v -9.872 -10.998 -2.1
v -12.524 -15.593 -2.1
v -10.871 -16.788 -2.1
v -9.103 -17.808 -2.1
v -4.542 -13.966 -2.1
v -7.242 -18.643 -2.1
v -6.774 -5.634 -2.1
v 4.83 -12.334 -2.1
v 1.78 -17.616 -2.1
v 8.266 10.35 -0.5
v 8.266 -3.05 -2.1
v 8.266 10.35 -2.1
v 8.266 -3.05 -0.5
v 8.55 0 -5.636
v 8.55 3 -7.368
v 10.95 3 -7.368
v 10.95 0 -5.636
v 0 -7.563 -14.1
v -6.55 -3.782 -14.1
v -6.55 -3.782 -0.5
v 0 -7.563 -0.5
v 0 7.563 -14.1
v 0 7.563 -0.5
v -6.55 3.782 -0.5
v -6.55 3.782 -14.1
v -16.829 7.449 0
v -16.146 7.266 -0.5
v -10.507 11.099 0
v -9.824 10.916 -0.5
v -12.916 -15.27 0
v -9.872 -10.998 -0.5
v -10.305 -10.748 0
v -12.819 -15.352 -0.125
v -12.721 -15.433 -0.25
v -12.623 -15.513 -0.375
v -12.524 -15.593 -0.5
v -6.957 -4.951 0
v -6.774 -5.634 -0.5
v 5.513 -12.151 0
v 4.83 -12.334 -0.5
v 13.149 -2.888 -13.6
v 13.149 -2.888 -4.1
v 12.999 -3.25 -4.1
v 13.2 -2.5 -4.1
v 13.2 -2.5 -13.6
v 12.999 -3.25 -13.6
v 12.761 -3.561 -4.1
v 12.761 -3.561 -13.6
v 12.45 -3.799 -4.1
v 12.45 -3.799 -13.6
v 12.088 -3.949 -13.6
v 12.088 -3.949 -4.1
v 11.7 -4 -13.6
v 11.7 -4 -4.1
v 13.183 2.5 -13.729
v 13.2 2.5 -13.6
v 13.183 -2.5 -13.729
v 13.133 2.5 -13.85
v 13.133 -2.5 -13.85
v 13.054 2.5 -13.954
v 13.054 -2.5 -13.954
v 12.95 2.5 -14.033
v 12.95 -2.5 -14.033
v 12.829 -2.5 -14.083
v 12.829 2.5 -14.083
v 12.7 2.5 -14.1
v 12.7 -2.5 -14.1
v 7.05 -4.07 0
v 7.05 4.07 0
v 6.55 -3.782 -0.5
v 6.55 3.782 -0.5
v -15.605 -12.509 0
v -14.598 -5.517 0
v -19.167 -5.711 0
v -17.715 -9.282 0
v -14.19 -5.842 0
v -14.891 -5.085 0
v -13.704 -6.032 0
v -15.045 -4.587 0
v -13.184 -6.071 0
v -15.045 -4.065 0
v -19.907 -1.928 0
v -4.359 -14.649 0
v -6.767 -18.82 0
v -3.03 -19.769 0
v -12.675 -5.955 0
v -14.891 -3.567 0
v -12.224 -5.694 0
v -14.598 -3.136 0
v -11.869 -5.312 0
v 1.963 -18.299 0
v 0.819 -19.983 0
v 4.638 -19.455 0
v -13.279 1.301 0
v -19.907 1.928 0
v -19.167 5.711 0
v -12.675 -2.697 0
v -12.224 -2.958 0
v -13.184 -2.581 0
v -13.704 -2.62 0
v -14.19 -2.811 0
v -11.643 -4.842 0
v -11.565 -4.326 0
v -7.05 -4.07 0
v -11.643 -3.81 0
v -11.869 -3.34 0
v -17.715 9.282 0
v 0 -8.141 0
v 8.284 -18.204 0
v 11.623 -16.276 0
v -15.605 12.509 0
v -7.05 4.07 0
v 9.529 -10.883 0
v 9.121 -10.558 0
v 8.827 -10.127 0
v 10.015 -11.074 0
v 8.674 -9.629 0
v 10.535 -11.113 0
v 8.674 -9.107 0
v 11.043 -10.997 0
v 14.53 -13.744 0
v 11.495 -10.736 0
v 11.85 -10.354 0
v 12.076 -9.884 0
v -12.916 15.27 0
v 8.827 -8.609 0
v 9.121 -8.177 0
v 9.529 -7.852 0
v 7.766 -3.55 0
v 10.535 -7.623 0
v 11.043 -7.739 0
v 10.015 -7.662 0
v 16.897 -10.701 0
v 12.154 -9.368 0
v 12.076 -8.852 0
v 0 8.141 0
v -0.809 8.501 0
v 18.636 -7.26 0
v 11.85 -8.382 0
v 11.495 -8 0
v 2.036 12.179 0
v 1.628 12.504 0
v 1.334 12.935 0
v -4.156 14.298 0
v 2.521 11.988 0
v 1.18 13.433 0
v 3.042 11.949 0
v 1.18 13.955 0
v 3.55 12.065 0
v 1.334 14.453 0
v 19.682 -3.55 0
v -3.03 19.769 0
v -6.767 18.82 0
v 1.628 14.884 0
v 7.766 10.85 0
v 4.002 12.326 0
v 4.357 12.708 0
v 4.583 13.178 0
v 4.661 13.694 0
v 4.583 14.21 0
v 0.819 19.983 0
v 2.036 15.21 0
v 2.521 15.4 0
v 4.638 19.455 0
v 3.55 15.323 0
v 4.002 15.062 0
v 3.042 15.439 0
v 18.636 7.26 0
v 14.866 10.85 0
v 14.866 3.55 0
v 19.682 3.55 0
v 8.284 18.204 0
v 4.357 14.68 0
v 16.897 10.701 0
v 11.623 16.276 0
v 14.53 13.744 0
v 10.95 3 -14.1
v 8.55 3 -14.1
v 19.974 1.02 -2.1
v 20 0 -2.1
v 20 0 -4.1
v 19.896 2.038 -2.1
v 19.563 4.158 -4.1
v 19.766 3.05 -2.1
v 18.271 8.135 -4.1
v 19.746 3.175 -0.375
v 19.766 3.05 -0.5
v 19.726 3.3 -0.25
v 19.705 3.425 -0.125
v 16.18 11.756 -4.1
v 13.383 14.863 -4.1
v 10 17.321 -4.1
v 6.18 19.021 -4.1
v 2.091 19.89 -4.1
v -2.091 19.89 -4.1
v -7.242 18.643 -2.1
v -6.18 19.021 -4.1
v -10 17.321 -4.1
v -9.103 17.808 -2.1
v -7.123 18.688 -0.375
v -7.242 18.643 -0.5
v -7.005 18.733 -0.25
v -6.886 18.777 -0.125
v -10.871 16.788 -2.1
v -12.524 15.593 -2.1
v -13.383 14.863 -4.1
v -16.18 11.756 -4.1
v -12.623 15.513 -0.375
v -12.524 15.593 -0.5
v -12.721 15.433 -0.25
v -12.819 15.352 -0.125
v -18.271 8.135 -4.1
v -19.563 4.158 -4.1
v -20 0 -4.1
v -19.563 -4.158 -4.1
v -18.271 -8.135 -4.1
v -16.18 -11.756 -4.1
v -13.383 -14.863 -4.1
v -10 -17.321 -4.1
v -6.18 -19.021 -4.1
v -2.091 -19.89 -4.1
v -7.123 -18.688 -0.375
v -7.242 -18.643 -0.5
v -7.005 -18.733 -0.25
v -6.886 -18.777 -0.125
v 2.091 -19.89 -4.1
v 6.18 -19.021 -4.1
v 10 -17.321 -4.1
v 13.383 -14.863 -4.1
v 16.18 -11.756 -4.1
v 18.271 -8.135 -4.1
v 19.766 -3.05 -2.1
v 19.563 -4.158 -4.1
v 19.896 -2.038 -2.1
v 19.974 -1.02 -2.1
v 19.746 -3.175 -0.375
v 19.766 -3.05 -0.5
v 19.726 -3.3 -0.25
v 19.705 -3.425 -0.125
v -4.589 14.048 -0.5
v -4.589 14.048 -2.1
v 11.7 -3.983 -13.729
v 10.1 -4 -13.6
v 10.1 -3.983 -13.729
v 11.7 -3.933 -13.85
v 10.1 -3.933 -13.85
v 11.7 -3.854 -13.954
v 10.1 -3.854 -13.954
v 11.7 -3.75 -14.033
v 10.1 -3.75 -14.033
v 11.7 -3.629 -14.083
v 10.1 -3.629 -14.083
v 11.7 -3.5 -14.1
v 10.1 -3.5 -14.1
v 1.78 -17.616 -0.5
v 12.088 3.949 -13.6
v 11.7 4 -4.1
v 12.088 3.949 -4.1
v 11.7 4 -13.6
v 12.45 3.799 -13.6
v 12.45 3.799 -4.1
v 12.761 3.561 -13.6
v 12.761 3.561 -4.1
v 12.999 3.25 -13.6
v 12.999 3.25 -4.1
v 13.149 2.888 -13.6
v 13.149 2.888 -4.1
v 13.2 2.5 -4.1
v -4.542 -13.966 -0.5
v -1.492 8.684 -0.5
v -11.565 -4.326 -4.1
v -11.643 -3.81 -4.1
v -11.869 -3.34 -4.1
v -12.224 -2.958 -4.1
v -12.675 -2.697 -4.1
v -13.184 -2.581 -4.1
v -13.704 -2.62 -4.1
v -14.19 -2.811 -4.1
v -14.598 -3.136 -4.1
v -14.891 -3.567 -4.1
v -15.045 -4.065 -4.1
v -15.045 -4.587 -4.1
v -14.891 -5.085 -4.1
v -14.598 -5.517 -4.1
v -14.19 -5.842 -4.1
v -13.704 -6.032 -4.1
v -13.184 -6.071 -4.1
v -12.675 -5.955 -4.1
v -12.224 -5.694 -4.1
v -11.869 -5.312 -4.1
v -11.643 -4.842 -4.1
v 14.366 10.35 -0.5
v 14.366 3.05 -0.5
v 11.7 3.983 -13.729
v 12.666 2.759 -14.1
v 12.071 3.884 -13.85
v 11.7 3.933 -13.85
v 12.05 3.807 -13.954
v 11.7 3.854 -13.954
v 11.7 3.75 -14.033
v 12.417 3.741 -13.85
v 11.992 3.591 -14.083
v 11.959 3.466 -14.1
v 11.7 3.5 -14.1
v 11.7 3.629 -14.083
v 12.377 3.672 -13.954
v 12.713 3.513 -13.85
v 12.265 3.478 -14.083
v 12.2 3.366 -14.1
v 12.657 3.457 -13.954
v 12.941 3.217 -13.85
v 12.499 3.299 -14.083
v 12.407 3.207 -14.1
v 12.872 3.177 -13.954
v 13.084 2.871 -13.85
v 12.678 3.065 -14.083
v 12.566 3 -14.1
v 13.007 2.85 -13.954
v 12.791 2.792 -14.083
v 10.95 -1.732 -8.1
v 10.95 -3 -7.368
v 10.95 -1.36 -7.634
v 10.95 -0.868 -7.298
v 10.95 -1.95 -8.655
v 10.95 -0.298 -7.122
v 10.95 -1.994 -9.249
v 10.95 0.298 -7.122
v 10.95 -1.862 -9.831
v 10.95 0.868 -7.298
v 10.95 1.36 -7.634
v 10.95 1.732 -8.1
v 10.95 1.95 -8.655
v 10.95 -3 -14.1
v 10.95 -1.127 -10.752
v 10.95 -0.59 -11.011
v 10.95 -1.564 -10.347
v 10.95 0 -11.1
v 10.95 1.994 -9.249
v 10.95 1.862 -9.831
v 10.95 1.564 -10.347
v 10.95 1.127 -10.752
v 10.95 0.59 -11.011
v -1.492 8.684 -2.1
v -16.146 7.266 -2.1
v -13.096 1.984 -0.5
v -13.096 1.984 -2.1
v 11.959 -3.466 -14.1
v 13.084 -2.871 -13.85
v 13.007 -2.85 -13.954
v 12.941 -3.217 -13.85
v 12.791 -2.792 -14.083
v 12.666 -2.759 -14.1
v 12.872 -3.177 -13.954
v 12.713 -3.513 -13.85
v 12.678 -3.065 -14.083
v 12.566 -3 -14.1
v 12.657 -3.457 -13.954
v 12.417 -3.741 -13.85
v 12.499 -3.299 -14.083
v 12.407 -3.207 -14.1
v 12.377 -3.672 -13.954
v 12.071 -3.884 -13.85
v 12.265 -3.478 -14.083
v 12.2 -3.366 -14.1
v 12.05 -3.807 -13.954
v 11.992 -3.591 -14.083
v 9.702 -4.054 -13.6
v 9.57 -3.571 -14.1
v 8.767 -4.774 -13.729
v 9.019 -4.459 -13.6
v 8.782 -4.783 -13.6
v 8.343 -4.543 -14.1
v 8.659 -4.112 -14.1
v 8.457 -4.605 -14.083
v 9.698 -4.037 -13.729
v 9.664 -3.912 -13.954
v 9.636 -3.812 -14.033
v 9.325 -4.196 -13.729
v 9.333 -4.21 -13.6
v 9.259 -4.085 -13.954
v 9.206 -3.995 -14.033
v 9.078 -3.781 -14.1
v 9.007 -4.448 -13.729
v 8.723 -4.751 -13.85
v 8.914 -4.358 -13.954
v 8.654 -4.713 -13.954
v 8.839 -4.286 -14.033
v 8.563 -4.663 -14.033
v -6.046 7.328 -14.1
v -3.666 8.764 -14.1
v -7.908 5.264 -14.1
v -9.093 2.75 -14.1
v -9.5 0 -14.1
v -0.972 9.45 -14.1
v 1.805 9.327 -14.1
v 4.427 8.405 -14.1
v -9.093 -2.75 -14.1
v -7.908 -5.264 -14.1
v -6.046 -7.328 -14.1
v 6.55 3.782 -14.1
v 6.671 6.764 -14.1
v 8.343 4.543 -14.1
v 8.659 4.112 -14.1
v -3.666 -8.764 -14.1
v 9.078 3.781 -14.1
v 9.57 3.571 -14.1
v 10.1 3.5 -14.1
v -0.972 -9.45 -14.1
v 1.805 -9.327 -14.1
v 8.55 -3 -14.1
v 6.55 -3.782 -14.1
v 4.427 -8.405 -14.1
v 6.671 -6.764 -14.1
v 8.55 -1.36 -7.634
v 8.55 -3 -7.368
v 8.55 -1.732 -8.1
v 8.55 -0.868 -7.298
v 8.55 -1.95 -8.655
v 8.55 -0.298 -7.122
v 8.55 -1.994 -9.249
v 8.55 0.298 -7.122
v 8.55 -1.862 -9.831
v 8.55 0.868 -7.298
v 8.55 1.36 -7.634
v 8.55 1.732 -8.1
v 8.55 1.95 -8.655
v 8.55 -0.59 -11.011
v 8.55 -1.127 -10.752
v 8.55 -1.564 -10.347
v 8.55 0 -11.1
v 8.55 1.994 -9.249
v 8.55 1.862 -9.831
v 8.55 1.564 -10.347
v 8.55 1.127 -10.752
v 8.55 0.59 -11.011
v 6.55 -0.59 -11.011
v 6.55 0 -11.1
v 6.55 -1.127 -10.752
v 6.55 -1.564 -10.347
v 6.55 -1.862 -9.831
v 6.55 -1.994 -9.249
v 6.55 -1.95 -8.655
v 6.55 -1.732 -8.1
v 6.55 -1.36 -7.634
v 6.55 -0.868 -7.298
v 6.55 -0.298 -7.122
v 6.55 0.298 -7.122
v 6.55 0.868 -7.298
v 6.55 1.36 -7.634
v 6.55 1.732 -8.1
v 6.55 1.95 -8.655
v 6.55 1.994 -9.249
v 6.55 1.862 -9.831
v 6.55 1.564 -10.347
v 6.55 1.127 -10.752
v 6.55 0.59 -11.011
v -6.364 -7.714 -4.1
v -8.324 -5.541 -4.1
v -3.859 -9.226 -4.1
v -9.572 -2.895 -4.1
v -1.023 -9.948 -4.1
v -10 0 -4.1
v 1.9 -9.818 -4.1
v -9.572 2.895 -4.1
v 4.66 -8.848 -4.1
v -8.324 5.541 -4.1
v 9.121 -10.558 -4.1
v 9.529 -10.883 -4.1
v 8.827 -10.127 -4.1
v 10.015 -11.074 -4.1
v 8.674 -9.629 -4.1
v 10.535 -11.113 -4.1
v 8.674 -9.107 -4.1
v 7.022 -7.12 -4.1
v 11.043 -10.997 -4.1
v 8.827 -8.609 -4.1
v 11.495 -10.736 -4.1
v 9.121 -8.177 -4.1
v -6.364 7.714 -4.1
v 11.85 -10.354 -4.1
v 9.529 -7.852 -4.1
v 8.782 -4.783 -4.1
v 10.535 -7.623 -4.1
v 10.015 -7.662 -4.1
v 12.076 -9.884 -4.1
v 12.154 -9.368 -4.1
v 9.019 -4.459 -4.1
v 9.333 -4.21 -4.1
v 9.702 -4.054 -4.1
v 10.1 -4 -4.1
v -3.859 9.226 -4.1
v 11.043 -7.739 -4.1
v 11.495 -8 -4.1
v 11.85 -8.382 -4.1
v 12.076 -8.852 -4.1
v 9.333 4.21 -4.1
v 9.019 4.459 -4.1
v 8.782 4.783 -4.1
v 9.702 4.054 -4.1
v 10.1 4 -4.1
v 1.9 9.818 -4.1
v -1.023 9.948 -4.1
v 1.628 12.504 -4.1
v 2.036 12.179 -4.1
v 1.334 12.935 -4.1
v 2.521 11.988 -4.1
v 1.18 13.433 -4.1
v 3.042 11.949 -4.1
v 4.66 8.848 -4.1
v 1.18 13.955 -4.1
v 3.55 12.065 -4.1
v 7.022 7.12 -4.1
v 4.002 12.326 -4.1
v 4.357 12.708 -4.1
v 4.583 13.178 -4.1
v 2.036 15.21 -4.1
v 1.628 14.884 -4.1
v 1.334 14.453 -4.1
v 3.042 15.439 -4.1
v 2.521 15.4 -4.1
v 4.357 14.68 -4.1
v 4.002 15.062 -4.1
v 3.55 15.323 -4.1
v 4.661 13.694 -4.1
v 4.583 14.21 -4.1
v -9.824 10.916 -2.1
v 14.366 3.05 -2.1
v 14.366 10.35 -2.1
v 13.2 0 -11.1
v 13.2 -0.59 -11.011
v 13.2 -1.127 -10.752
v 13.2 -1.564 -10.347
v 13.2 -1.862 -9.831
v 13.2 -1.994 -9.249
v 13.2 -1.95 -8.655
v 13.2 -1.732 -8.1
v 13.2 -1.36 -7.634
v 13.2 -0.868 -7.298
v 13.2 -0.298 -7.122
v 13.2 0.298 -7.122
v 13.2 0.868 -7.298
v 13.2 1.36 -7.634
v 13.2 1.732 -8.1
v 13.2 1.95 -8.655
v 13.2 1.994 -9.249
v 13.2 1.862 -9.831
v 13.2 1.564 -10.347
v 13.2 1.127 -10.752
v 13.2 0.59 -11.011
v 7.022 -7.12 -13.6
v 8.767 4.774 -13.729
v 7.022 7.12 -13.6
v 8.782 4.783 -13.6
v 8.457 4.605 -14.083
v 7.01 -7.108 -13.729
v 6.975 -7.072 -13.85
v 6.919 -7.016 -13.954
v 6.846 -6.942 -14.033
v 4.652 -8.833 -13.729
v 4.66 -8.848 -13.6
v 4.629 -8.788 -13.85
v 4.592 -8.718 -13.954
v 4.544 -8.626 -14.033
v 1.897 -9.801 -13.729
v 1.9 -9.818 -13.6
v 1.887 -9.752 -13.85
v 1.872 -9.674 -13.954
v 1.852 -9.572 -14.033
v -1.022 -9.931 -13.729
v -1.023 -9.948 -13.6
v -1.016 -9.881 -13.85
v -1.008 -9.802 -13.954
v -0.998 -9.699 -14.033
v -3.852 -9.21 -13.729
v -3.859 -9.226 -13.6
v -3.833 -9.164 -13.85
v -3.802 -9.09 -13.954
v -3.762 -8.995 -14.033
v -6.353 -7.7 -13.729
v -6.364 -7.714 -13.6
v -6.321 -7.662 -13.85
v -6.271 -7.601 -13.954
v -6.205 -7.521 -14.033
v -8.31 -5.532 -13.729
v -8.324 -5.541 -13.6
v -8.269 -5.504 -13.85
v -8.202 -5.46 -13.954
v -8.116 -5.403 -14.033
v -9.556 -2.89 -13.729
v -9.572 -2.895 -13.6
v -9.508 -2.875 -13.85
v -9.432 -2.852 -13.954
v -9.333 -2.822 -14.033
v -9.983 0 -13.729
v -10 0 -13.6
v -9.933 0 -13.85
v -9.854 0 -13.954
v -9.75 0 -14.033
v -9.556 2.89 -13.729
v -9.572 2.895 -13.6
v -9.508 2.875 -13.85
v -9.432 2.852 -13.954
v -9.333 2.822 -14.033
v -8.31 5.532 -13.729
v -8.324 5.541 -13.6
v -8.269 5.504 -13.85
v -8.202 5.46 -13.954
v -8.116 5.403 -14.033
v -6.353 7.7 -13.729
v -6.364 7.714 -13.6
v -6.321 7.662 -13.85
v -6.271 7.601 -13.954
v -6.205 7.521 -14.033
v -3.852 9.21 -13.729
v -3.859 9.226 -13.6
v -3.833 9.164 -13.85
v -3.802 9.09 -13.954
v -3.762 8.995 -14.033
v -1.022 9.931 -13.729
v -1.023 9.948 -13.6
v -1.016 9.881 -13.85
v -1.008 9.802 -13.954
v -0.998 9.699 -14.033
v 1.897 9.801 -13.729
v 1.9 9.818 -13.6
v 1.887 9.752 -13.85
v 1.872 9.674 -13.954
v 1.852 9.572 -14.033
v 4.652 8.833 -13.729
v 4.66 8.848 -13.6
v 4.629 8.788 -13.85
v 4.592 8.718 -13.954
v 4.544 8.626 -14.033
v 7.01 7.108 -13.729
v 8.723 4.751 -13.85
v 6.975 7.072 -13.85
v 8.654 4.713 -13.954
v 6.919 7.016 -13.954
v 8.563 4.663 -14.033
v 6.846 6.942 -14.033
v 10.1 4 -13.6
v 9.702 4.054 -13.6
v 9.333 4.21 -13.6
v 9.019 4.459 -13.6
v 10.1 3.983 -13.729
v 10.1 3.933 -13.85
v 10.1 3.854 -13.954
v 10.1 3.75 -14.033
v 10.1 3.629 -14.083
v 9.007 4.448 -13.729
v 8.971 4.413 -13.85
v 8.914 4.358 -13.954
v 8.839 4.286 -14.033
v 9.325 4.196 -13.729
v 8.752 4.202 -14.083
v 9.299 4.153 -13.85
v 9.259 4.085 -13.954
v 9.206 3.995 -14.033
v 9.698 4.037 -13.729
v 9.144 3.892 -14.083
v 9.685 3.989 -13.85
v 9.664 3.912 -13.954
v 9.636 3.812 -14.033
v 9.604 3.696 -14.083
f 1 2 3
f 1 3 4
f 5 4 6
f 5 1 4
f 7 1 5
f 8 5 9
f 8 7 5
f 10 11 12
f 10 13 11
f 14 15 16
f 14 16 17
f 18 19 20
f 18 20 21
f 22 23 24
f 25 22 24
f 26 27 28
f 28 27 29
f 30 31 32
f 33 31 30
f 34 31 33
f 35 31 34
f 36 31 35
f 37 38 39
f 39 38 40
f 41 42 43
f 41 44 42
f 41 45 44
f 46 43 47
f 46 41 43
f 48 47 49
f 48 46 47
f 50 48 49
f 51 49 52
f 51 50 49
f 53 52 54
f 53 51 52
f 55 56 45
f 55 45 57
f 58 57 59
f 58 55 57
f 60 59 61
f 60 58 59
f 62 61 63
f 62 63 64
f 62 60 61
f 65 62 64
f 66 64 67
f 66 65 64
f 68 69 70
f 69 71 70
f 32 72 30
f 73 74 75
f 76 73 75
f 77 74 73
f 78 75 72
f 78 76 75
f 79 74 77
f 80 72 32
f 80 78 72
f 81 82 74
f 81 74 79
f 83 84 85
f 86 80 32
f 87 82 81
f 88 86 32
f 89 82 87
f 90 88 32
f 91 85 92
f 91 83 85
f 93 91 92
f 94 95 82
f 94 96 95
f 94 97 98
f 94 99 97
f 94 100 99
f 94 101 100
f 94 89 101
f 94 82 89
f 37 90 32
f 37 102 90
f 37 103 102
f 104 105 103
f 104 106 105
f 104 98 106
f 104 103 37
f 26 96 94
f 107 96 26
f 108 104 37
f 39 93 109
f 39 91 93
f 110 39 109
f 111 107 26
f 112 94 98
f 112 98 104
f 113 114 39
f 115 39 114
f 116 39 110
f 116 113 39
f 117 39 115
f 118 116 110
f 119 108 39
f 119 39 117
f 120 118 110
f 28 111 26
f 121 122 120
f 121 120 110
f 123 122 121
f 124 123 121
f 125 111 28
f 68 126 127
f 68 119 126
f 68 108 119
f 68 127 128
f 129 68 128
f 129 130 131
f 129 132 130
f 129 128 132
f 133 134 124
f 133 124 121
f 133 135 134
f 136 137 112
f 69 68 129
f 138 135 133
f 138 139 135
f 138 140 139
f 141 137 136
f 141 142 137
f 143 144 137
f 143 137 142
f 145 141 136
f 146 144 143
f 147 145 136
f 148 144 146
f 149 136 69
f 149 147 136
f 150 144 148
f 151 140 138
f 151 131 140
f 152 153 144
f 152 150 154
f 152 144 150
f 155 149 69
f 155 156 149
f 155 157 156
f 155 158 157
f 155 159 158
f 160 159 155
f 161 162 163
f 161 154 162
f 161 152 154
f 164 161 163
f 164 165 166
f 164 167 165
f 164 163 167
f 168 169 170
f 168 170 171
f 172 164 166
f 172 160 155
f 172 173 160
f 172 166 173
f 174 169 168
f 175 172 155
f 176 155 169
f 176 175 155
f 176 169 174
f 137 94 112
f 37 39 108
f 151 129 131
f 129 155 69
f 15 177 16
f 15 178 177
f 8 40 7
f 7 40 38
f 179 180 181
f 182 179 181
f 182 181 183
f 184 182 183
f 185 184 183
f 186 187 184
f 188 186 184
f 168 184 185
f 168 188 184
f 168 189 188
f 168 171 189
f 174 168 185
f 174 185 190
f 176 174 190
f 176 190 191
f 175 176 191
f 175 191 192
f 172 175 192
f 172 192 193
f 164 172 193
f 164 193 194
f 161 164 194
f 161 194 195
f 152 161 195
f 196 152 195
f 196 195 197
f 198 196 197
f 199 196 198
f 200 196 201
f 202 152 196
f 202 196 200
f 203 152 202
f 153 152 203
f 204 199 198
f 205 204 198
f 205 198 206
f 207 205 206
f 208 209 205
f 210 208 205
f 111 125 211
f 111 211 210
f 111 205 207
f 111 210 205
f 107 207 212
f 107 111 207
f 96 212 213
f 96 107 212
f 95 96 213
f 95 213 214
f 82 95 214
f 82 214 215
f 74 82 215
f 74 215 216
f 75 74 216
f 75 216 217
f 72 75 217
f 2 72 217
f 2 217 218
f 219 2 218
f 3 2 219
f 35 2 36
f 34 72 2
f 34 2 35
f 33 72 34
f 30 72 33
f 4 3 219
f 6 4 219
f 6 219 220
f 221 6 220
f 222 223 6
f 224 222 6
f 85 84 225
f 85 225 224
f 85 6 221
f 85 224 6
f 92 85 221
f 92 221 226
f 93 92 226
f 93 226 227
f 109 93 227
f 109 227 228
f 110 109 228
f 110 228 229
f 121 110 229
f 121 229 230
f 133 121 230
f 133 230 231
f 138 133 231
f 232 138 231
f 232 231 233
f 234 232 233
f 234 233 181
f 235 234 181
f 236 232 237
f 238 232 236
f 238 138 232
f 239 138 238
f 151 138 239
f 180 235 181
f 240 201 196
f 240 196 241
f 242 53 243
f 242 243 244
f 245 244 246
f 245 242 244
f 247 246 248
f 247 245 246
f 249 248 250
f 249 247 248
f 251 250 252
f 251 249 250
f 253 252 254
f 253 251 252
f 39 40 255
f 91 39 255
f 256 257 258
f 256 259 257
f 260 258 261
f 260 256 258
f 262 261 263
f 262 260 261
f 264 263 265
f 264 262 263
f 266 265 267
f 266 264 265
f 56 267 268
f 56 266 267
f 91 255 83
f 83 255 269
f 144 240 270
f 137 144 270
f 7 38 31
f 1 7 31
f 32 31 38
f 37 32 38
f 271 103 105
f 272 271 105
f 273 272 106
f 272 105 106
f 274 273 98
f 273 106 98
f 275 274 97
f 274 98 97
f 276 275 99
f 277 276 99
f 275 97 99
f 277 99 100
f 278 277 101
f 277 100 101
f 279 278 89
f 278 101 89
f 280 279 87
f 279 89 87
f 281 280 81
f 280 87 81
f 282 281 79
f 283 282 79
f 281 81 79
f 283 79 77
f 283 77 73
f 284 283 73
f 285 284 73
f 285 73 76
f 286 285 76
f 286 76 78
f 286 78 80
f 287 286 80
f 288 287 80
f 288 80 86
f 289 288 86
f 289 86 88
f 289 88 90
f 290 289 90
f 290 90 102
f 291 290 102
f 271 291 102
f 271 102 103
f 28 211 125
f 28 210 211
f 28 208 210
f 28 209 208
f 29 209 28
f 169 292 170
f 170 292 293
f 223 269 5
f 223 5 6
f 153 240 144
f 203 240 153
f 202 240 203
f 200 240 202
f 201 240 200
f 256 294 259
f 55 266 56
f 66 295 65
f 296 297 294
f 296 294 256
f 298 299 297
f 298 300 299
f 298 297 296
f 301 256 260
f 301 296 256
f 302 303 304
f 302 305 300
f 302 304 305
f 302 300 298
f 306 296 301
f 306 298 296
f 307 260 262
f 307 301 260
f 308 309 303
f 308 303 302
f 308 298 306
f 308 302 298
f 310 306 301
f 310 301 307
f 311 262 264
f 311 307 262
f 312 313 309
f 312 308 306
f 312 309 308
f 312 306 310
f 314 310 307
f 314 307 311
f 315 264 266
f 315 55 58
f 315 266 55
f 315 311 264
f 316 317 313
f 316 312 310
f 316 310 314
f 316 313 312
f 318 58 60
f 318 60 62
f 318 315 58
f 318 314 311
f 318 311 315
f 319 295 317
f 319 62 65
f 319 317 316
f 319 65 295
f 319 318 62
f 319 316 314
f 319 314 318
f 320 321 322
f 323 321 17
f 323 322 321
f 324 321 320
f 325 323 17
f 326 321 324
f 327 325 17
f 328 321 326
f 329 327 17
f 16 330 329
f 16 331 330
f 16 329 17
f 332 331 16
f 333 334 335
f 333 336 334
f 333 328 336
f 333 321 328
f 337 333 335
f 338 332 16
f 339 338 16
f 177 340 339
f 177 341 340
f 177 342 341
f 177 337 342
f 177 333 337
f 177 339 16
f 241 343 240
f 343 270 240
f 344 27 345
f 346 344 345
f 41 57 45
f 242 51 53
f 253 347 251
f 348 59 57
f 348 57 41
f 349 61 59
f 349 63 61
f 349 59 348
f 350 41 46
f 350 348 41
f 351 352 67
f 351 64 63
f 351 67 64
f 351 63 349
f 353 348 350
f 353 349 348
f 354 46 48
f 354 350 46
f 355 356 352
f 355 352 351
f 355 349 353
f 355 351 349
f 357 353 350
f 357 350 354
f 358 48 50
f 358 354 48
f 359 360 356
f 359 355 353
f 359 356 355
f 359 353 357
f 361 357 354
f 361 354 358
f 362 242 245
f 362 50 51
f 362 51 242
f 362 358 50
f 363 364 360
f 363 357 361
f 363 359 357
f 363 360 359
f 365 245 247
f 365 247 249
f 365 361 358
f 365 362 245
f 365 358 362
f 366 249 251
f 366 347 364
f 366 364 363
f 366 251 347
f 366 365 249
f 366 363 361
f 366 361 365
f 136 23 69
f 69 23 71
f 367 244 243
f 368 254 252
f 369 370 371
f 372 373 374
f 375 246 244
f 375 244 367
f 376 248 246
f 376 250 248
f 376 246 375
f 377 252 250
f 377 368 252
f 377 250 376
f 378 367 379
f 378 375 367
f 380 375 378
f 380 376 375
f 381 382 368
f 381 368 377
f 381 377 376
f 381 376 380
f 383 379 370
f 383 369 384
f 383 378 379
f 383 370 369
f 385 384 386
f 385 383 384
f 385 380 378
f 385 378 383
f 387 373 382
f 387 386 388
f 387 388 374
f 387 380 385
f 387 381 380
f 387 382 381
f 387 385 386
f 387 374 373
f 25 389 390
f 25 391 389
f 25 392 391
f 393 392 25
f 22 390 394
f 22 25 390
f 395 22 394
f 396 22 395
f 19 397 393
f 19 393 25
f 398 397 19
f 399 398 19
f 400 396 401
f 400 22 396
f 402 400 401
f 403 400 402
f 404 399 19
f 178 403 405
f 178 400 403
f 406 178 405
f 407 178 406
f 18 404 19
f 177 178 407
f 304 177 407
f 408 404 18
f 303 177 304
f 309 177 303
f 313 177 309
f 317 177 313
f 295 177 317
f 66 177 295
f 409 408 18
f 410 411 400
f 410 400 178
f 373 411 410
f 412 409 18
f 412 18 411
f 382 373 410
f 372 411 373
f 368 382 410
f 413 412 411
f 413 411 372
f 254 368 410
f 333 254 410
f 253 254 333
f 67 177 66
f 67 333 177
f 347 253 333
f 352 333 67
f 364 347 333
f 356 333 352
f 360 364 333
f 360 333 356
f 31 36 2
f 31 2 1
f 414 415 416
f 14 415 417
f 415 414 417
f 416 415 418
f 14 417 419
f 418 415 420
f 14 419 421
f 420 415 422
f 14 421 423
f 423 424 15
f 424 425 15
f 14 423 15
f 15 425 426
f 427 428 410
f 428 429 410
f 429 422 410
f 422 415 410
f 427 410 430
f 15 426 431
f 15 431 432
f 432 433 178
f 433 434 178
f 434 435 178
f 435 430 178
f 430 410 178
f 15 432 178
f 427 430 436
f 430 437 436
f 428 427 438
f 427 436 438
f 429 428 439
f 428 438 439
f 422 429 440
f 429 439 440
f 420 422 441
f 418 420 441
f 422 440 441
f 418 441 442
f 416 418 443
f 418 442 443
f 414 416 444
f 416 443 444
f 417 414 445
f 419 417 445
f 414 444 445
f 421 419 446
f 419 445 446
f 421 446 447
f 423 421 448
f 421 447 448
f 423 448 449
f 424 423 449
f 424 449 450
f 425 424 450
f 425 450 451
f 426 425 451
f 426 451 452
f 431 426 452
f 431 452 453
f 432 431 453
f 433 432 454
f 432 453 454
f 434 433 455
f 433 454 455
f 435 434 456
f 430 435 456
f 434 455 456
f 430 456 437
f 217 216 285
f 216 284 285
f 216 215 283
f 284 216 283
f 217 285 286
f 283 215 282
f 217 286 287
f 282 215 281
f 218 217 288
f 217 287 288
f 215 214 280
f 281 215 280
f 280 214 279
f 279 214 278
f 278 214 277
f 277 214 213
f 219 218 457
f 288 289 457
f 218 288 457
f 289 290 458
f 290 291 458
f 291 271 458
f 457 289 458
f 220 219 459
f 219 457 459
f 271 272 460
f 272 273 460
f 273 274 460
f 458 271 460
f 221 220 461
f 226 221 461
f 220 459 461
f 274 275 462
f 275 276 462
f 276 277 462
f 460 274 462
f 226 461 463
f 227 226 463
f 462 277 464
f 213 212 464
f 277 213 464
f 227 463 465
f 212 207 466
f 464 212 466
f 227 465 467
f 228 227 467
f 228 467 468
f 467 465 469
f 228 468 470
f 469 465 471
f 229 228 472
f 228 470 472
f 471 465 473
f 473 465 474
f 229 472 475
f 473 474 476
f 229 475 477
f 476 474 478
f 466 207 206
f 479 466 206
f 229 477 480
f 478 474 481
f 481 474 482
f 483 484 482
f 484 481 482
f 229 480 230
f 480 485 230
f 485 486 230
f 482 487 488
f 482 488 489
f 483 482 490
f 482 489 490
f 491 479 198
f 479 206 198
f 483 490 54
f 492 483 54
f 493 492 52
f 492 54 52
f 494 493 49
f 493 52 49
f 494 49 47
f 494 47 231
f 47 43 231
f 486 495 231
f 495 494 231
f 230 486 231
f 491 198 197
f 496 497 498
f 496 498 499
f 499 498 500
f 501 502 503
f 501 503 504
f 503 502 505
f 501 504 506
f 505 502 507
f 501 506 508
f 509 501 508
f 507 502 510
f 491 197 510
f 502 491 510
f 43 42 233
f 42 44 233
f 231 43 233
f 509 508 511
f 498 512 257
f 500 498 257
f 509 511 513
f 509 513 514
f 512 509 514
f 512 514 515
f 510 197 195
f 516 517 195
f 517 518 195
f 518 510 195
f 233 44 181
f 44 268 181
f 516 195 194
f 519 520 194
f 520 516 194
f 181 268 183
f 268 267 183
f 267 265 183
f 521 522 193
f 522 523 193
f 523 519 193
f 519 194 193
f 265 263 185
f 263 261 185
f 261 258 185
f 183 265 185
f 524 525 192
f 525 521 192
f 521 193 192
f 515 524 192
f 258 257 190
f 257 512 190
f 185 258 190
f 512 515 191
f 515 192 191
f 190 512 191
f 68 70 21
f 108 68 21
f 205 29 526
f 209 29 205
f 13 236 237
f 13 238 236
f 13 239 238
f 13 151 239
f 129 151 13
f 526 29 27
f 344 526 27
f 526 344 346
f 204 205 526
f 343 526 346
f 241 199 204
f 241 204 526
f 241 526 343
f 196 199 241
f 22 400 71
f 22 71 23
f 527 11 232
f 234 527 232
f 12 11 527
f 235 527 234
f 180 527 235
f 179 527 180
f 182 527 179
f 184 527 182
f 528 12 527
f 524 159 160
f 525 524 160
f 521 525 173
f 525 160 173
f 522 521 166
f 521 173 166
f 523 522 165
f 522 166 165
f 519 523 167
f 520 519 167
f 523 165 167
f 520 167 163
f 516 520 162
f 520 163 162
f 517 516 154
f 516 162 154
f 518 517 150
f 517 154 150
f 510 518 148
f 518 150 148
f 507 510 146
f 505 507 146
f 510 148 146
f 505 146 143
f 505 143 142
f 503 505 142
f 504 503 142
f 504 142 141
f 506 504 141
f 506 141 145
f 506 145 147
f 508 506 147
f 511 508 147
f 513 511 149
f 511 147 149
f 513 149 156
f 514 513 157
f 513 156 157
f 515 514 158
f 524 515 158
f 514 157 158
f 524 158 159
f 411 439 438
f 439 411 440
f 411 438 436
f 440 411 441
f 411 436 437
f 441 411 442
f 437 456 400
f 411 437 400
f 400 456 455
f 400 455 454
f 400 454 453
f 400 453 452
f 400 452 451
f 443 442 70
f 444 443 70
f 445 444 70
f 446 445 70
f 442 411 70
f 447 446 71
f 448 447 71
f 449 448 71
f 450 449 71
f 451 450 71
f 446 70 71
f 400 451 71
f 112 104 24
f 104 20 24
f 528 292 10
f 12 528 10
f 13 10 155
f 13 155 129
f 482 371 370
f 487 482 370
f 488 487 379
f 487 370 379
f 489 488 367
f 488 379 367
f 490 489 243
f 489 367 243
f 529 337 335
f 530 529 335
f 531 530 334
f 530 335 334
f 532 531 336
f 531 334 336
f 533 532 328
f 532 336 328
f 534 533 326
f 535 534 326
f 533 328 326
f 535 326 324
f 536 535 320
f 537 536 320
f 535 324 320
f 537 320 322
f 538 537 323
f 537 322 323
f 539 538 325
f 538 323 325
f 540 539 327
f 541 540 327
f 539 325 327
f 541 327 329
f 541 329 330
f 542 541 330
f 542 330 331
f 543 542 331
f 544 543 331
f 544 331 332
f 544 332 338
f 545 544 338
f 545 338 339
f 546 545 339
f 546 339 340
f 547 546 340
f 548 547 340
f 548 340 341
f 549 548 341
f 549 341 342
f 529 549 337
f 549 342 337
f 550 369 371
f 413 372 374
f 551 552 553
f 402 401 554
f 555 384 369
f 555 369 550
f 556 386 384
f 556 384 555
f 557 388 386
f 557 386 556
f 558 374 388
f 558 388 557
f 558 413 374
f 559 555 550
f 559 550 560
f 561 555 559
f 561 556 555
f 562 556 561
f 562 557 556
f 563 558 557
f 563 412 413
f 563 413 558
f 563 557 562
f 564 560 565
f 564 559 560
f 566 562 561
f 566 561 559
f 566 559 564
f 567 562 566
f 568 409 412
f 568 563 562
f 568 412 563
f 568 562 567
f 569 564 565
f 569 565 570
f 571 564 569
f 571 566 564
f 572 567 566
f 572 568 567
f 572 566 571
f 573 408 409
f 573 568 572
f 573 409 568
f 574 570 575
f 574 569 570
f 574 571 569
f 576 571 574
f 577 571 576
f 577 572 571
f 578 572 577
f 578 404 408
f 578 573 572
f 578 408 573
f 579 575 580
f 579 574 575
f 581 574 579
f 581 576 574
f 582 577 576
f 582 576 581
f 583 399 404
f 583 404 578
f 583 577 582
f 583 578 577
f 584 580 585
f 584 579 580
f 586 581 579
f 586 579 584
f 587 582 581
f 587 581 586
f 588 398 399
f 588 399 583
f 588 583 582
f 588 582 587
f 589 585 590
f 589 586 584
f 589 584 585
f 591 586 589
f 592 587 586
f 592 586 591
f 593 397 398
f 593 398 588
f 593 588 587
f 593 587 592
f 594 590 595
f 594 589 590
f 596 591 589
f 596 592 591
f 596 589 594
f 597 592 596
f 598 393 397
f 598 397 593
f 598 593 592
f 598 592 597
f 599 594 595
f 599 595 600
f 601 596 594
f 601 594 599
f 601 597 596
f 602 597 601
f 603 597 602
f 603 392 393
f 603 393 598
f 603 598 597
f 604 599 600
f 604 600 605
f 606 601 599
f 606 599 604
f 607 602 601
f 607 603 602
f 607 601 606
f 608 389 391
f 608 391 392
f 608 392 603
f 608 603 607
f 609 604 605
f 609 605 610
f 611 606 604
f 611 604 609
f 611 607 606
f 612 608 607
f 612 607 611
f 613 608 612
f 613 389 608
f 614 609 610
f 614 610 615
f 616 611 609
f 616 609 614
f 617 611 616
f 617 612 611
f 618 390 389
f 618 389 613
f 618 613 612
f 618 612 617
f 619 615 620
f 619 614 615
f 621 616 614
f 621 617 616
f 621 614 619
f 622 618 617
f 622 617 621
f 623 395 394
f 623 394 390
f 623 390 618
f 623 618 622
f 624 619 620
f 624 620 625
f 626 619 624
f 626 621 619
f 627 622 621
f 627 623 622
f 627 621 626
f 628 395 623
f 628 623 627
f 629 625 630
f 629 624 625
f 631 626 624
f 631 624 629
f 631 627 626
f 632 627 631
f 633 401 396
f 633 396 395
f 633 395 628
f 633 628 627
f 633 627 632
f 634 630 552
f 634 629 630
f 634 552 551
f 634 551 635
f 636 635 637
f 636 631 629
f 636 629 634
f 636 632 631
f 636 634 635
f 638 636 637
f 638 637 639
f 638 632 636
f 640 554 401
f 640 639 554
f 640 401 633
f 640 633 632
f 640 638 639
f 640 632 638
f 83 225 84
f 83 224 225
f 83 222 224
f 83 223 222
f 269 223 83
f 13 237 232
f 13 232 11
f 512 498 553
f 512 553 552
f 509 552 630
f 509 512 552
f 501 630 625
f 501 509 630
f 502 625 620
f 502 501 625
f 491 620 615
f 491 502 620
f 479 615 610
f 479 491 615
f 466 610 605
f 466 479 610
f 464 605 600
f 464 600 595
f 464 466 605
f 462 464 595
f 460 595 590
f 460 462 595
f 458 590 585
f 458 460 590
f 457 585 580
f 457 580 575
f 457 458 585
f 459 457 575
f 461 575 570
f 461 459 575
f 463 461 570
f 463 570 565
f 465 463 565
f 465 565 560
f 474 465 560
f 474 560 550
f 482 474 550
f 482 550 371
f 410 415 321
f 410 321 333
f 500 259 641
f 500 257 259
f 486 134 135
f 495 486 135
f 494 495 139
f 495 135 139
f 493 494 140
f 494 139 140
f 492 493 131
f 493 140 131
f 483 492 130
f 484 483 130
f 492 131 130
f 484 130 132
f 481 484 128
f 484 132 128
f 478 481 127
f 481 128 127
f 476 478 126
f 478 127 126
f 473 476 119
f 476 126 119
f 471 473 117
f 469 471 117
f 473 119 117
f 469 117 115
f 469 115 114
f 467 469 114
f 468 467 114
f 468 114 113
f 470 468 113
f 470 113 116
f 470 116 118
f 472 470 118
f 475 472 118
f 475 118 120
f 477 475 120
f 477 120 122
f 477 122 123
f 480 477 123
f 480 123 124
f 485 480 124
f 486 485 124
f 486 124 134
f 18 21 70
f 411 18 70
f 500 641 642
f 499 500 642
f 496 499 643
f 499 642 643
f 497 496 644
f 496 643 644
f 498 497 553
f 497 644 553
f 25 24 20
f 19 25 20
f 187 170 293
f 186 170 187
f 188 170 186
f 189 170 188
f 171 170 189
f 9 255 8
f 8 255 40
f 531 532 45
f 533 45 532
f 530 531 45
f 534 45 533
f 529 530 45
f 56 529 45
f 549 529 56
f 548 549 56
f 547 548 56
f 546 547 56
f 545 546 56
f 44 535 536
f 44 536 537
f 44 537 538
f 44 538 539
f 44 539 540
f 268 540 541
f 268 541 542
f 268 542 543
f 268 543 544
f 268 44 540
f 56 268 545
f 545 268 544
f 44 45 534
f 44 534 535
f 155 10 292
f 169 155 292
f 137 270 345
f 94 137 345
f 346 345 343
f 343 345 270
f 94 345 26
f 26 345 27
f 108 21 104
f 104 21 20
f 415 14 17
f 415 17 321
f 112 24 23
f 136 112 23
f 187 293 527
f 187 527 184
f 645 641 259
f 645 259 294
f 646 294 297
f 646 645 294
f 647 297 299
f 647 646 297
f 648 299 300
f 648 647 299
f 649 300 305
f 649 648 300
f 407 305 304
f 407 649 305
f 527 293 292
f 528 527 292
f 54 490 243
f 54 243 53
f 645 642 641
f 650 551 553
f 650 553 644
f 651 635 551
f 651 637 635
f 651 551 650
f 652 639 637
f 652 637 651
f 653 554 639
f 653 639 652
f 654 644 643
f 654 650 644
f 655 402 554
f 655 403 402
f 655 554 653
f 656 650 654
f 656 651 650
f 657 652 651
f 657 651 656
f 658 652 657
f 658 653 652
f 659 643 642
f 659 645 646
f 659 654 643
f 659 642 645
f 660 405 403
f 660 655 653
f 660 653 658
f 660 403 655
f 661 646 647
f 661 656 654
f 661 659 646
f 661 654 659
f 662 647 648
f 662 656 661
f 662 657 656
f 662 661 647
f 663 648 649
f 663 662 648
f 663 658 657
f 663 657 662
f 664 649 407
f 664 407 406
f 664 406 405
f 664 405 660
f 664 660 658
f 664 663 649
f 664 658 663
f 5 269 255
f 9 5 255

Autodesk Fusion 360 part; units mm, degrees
sketch "Esquisse1" plane through (0, 0, 0) normal (0, 0, 1) x (1, 0, 0)
  circle A0 centre (0, 0) radius 20
  line L0 (19.7661, -3.05) -> (8.2661, -3.05)
  line L1 (8.2661, -3.05) -> (8.2661, 3.1)
  line L2 (14.3661, 3.05) -> (19.7661, 3.05)
  line L3 (8.2661, -3.05) -> (14.4602, -3.05)
  line L4 (14.3661, 10.35) -> (8.2661, 10.35)
  line L5 (8.2661, 10.35) -> (8.2661, -3.05)
  line L6 (0, 0) -> (29, 0) construction
  line L7 (14.3661, 3.05) -> (14.3661, 10.35)
  line L8 (-9.8244, 10.9164) -> (-16.1464, 7.2664)
  line L9 (-16.1464, 7.2664) -> (-13.0964, 1.9836)
  line L10 (-13.0964, 1.9836) -> (-1.4917, 8.6836)
  line L11 (-1.4917, 8.6836) -> (-4.5887, 14.0479)
  line L12 (-7.2417, 18.6429) -> (-1.4917, 8.6836)
  line L13 (-9.8244, 10.9164) -> (-12.5244, 15.5929)
  line L14 (-4.5417, -13.9664) -> (1.7803, -17.6164)
  line L15 (1.7803, -17.6164) -> (4.8303, -12.3336)
  line L16 (4.8303, -12.3336) -> (-6.7744, -5.6336)
  line L17 (-6.7744, -5.6336) -> (-9.8715, -10.9979)
  line L18 (-12.5244, -15.5929) -> (-6.7744, -5.6336)
  line L19 (-4.5417, -13.9664) -> (-7.2417, -18.6429)
  circle A1 centre (2.9108, 13.6941) radius 1.75
  line L20 (0, 0) -> (2.9108, 13.6941) construction
  circle A2 centre (-13.3148, -4.3262) radius 1.75
  circle A3 centre (10.404, -9.3678) radius 1.75
  line L21 (6.55, 3.7816) -> (0, 7.5633)
  line L22 (0, 7.5633) -> (-6.55, 3.7816)
  line L23 (-6.55, 3.7816) -> (-6.55, -3.7816)
  line L24 (-6.55, -3.7816) -> (0, -7.5633)
  line L25 (0, -7.5633) -> (6.55, -3.7816)
  line L26 (6.55, -3.7816) -> (6.55, 3.7816)
  dimension "d1" = 40
  dimension "d2" = 6.1
  dimension "d3" = 11.5
  dimension "d6" = 6.1
  dimension "d7" = 3.05
  dimension "d8" = 13.4
  dimension "d10" = 360
  dimension "d16" = 3.5
  dimension "d17" = 78
  dimension "d19" = 360
  dimension "d21" = 14
  dimension "d25" = 6.55
extrude "Extrusion1" add sketch "Esquisse1" against normal blind 4.1 contours A0 L0 L1 L2 L3 L4 L5 L7 | A0 L0 L1 L2 L3 L4 L5 L7 L8 L9 L10 L11 L12 L13 L14 L15 L16 L17 L18 L19 | A0 L8 L9 L10 L11 L12 L13 | A0 L14 L15 L16 L17 L18 L19 | A1 | A2 | A3 | L21 L22 L23 L24 L25 L26
extrude "Extrusion2" cut sketch "Esquisse1" against normal blind 2.1 contours A0 L0 L1 L2 L3 L4 L5 L7 | A0 L8 L9 L10 L11 L12 L13 | A0 L14 L15 L16 L17 L18 L19
chamfer "Chanfrein1" distance 0.5 angle 45 15 edges at (-4.3667, 13.6633, 0) (-11.1744, 13.2546, 0) (-12.9854, 9.0914, 0) (-14.6214, 4.625, 0) (-7.294, 5.3336, 0) (-9.6494, -10.6133, 0) (-0.972, -8.9836, 0) (-5.8917, -16.3046, 0) (-1.3807, -15.7914, 0) (3.3053, -14.975, 0) (8.2661, 3.65, 0) (14.0161, -3.05, 0) (17.0661, 3.05, 0) (14.3661, 6.7, 0) (11.3161, 10.35, 0)
extrude "Extrusion5" cut sketch "Esquisse1" against normal blind 4.1 contours A1 | A2 | A3
extrude "Extrusion6" cut sketch "Esquisse1" against normal blind 4.1 contours L21 L22 L23 L24 L25 L26
chamfer "Chanfrein4" distance 0.5 angle 45 6 edges at (-6.55, 0, 0) (-3.275, 5.6725, 0) (3.275, 5.6725, 0) (6.55, 0, 0) (3.275, -5.6725, 0) (-3.275, -5.6725, 0)
sketch "Esquisse2" plane through (0, 0, -4.1) normal (0, 0, -1) x (1, 0, 0)
  circle A0 centre (0, 0) radius 20
  circle A1 centre (2.9108, -13.6941) radius 1.75
  circle A2 centre (10.404, 9.3678) radius 1.75
  circle A3 centre (-13.3148, 4.3262) radius 1.75
  line L0 (9.1652, 4) -> (13.2, 4)
  line L1 (13.2, 4) -> (13.2, -4)
  line L2 (13.2, -4) -> (9.1652, -4)
  arc A4 (9.1652, 4) -> (9.1652, -4) centre (0, 0) ccw
  line L3 (6.55, -3.7816) -> (0, -7.5633)
  line L4 (0, -7.5633) -> (-6.55, -3.7816)
  line L5 (-6.55, -3.7816) -> (-6.55, 3.7816)
  line L6 (-6.55, 3.7816) -> (0, 7.5633)
  line L7 (0, 7.5633) -> (6.55, 3.7816)
  line L8 (6.55, 3.7816) -> (6.55, -3.7816)
  dimension "d36" = 20
  dimension "d37" = 8
  dimension "d39" = 4
extrude "Extrusion7" add sketch "Esquisse2" along normal blind 10 contours L0 L1 L2 A4
ref_plane "Plan de construction2" through (8.55, 0, -7.3) normal (-1, 0, 0) x (0, 1, 0)
sketch "Esquisse3" plane through (8.55, 0, 0) normal (-1, 0, 0) x (0, 1, 0)
  line L0 (4, -4.1) -> (-4, -4.1)
  line L1 (-4, -4.1) -> (-4, -14.1)
  line L2 (-4, -14.1) -> (4, -14.1)
  line L3 (4, -14.1) -> (4, -4.1)
  line L4 (-3, -14.1) -> (3, -14.1)
  line L5 (3, -14.1) -> (3, -9.1)
  line L6 (3, -9.1) -> (-3, -9.1) construction
  line L7 (-3, -9.1) -> (-3, -14.1)
  line L8 (3, -7.3679) -> (0, -5.6359)
  line L9 (0, -5.6359) -> (-3, -7.3679)
  line L10 (-3, -7.3679) -> (-3, -10.8321)
  line L11 (3, -10.8321) -> (3, -7.3679)
  line L12 (10.85, 0) -> (-3.55, 0)
  line L13 (3, 9.1) -> (-3, 9.1) construction
  line L14 (0, 5.6359) -> (-3, 7.3679)
  line L15 (3, 10.8321) -> (3, 7.3679)
  line L16 (-4, 14.1) -> (4, 14.1)
  line L17 (4, 4.1) -> (-4, 4.1)
  line L18 (-3, 14.1) -> (3, 14.1)
  line L19 (-3, 9.1) -> (-3, 14.1)
  line L20 (3, 14.1) -> (3, 9.1)
  line L21 (3, 7.3679) -> (0, 5.6359)
  line L22 (-4, 4.1) -> (-4, 14.1)
  line L23 (-3, 7.3679) -> (-3, 10.8321)
  line L24 (4, 14.1) -> (4, 4.1)
  point P0 (0, -9.1)
  point P1 (0, 9.1)
  dimension "d42" = 5
  dimension "d43" = 6
  dimension "d44" = 1
extrude "Extrusion8" cut sketch "Esquisse3" against normal blind 2.4 contours L14 L15 L16 L18 L19 L20 L21 L23
hole "Perçage1" at (13.2, 0, -9.1) direction (-1, 0, 0) diameter 4 depth 7 tip angle 180
fillet "Congé1" radius 1.5 4 edges at (13.2, -4, -9.1) (13.2, 4, -9.1) (9.1652, 4, -9.1) (9.1652, -4, -9.1)
fillet "Congé2" radius 0.5 8 edges at (10.8998, -4, -14.1) (9.3334, -4.2104, -14.1) (-10, 0, -14.1) (9.3334, 4.2104, -14.1) (10.8998, 4, -14.1) (12.7607, 3.5607, -14.1) (13.2, 0, -14.1) (12.7607, -3.5607, -14.1)
equation "d6 = d2"
equation "d7 = d2 / 2"
equation "d39 = d37 / 2"
equation "d44 = ( 8 mm - d43 ) / 2"
